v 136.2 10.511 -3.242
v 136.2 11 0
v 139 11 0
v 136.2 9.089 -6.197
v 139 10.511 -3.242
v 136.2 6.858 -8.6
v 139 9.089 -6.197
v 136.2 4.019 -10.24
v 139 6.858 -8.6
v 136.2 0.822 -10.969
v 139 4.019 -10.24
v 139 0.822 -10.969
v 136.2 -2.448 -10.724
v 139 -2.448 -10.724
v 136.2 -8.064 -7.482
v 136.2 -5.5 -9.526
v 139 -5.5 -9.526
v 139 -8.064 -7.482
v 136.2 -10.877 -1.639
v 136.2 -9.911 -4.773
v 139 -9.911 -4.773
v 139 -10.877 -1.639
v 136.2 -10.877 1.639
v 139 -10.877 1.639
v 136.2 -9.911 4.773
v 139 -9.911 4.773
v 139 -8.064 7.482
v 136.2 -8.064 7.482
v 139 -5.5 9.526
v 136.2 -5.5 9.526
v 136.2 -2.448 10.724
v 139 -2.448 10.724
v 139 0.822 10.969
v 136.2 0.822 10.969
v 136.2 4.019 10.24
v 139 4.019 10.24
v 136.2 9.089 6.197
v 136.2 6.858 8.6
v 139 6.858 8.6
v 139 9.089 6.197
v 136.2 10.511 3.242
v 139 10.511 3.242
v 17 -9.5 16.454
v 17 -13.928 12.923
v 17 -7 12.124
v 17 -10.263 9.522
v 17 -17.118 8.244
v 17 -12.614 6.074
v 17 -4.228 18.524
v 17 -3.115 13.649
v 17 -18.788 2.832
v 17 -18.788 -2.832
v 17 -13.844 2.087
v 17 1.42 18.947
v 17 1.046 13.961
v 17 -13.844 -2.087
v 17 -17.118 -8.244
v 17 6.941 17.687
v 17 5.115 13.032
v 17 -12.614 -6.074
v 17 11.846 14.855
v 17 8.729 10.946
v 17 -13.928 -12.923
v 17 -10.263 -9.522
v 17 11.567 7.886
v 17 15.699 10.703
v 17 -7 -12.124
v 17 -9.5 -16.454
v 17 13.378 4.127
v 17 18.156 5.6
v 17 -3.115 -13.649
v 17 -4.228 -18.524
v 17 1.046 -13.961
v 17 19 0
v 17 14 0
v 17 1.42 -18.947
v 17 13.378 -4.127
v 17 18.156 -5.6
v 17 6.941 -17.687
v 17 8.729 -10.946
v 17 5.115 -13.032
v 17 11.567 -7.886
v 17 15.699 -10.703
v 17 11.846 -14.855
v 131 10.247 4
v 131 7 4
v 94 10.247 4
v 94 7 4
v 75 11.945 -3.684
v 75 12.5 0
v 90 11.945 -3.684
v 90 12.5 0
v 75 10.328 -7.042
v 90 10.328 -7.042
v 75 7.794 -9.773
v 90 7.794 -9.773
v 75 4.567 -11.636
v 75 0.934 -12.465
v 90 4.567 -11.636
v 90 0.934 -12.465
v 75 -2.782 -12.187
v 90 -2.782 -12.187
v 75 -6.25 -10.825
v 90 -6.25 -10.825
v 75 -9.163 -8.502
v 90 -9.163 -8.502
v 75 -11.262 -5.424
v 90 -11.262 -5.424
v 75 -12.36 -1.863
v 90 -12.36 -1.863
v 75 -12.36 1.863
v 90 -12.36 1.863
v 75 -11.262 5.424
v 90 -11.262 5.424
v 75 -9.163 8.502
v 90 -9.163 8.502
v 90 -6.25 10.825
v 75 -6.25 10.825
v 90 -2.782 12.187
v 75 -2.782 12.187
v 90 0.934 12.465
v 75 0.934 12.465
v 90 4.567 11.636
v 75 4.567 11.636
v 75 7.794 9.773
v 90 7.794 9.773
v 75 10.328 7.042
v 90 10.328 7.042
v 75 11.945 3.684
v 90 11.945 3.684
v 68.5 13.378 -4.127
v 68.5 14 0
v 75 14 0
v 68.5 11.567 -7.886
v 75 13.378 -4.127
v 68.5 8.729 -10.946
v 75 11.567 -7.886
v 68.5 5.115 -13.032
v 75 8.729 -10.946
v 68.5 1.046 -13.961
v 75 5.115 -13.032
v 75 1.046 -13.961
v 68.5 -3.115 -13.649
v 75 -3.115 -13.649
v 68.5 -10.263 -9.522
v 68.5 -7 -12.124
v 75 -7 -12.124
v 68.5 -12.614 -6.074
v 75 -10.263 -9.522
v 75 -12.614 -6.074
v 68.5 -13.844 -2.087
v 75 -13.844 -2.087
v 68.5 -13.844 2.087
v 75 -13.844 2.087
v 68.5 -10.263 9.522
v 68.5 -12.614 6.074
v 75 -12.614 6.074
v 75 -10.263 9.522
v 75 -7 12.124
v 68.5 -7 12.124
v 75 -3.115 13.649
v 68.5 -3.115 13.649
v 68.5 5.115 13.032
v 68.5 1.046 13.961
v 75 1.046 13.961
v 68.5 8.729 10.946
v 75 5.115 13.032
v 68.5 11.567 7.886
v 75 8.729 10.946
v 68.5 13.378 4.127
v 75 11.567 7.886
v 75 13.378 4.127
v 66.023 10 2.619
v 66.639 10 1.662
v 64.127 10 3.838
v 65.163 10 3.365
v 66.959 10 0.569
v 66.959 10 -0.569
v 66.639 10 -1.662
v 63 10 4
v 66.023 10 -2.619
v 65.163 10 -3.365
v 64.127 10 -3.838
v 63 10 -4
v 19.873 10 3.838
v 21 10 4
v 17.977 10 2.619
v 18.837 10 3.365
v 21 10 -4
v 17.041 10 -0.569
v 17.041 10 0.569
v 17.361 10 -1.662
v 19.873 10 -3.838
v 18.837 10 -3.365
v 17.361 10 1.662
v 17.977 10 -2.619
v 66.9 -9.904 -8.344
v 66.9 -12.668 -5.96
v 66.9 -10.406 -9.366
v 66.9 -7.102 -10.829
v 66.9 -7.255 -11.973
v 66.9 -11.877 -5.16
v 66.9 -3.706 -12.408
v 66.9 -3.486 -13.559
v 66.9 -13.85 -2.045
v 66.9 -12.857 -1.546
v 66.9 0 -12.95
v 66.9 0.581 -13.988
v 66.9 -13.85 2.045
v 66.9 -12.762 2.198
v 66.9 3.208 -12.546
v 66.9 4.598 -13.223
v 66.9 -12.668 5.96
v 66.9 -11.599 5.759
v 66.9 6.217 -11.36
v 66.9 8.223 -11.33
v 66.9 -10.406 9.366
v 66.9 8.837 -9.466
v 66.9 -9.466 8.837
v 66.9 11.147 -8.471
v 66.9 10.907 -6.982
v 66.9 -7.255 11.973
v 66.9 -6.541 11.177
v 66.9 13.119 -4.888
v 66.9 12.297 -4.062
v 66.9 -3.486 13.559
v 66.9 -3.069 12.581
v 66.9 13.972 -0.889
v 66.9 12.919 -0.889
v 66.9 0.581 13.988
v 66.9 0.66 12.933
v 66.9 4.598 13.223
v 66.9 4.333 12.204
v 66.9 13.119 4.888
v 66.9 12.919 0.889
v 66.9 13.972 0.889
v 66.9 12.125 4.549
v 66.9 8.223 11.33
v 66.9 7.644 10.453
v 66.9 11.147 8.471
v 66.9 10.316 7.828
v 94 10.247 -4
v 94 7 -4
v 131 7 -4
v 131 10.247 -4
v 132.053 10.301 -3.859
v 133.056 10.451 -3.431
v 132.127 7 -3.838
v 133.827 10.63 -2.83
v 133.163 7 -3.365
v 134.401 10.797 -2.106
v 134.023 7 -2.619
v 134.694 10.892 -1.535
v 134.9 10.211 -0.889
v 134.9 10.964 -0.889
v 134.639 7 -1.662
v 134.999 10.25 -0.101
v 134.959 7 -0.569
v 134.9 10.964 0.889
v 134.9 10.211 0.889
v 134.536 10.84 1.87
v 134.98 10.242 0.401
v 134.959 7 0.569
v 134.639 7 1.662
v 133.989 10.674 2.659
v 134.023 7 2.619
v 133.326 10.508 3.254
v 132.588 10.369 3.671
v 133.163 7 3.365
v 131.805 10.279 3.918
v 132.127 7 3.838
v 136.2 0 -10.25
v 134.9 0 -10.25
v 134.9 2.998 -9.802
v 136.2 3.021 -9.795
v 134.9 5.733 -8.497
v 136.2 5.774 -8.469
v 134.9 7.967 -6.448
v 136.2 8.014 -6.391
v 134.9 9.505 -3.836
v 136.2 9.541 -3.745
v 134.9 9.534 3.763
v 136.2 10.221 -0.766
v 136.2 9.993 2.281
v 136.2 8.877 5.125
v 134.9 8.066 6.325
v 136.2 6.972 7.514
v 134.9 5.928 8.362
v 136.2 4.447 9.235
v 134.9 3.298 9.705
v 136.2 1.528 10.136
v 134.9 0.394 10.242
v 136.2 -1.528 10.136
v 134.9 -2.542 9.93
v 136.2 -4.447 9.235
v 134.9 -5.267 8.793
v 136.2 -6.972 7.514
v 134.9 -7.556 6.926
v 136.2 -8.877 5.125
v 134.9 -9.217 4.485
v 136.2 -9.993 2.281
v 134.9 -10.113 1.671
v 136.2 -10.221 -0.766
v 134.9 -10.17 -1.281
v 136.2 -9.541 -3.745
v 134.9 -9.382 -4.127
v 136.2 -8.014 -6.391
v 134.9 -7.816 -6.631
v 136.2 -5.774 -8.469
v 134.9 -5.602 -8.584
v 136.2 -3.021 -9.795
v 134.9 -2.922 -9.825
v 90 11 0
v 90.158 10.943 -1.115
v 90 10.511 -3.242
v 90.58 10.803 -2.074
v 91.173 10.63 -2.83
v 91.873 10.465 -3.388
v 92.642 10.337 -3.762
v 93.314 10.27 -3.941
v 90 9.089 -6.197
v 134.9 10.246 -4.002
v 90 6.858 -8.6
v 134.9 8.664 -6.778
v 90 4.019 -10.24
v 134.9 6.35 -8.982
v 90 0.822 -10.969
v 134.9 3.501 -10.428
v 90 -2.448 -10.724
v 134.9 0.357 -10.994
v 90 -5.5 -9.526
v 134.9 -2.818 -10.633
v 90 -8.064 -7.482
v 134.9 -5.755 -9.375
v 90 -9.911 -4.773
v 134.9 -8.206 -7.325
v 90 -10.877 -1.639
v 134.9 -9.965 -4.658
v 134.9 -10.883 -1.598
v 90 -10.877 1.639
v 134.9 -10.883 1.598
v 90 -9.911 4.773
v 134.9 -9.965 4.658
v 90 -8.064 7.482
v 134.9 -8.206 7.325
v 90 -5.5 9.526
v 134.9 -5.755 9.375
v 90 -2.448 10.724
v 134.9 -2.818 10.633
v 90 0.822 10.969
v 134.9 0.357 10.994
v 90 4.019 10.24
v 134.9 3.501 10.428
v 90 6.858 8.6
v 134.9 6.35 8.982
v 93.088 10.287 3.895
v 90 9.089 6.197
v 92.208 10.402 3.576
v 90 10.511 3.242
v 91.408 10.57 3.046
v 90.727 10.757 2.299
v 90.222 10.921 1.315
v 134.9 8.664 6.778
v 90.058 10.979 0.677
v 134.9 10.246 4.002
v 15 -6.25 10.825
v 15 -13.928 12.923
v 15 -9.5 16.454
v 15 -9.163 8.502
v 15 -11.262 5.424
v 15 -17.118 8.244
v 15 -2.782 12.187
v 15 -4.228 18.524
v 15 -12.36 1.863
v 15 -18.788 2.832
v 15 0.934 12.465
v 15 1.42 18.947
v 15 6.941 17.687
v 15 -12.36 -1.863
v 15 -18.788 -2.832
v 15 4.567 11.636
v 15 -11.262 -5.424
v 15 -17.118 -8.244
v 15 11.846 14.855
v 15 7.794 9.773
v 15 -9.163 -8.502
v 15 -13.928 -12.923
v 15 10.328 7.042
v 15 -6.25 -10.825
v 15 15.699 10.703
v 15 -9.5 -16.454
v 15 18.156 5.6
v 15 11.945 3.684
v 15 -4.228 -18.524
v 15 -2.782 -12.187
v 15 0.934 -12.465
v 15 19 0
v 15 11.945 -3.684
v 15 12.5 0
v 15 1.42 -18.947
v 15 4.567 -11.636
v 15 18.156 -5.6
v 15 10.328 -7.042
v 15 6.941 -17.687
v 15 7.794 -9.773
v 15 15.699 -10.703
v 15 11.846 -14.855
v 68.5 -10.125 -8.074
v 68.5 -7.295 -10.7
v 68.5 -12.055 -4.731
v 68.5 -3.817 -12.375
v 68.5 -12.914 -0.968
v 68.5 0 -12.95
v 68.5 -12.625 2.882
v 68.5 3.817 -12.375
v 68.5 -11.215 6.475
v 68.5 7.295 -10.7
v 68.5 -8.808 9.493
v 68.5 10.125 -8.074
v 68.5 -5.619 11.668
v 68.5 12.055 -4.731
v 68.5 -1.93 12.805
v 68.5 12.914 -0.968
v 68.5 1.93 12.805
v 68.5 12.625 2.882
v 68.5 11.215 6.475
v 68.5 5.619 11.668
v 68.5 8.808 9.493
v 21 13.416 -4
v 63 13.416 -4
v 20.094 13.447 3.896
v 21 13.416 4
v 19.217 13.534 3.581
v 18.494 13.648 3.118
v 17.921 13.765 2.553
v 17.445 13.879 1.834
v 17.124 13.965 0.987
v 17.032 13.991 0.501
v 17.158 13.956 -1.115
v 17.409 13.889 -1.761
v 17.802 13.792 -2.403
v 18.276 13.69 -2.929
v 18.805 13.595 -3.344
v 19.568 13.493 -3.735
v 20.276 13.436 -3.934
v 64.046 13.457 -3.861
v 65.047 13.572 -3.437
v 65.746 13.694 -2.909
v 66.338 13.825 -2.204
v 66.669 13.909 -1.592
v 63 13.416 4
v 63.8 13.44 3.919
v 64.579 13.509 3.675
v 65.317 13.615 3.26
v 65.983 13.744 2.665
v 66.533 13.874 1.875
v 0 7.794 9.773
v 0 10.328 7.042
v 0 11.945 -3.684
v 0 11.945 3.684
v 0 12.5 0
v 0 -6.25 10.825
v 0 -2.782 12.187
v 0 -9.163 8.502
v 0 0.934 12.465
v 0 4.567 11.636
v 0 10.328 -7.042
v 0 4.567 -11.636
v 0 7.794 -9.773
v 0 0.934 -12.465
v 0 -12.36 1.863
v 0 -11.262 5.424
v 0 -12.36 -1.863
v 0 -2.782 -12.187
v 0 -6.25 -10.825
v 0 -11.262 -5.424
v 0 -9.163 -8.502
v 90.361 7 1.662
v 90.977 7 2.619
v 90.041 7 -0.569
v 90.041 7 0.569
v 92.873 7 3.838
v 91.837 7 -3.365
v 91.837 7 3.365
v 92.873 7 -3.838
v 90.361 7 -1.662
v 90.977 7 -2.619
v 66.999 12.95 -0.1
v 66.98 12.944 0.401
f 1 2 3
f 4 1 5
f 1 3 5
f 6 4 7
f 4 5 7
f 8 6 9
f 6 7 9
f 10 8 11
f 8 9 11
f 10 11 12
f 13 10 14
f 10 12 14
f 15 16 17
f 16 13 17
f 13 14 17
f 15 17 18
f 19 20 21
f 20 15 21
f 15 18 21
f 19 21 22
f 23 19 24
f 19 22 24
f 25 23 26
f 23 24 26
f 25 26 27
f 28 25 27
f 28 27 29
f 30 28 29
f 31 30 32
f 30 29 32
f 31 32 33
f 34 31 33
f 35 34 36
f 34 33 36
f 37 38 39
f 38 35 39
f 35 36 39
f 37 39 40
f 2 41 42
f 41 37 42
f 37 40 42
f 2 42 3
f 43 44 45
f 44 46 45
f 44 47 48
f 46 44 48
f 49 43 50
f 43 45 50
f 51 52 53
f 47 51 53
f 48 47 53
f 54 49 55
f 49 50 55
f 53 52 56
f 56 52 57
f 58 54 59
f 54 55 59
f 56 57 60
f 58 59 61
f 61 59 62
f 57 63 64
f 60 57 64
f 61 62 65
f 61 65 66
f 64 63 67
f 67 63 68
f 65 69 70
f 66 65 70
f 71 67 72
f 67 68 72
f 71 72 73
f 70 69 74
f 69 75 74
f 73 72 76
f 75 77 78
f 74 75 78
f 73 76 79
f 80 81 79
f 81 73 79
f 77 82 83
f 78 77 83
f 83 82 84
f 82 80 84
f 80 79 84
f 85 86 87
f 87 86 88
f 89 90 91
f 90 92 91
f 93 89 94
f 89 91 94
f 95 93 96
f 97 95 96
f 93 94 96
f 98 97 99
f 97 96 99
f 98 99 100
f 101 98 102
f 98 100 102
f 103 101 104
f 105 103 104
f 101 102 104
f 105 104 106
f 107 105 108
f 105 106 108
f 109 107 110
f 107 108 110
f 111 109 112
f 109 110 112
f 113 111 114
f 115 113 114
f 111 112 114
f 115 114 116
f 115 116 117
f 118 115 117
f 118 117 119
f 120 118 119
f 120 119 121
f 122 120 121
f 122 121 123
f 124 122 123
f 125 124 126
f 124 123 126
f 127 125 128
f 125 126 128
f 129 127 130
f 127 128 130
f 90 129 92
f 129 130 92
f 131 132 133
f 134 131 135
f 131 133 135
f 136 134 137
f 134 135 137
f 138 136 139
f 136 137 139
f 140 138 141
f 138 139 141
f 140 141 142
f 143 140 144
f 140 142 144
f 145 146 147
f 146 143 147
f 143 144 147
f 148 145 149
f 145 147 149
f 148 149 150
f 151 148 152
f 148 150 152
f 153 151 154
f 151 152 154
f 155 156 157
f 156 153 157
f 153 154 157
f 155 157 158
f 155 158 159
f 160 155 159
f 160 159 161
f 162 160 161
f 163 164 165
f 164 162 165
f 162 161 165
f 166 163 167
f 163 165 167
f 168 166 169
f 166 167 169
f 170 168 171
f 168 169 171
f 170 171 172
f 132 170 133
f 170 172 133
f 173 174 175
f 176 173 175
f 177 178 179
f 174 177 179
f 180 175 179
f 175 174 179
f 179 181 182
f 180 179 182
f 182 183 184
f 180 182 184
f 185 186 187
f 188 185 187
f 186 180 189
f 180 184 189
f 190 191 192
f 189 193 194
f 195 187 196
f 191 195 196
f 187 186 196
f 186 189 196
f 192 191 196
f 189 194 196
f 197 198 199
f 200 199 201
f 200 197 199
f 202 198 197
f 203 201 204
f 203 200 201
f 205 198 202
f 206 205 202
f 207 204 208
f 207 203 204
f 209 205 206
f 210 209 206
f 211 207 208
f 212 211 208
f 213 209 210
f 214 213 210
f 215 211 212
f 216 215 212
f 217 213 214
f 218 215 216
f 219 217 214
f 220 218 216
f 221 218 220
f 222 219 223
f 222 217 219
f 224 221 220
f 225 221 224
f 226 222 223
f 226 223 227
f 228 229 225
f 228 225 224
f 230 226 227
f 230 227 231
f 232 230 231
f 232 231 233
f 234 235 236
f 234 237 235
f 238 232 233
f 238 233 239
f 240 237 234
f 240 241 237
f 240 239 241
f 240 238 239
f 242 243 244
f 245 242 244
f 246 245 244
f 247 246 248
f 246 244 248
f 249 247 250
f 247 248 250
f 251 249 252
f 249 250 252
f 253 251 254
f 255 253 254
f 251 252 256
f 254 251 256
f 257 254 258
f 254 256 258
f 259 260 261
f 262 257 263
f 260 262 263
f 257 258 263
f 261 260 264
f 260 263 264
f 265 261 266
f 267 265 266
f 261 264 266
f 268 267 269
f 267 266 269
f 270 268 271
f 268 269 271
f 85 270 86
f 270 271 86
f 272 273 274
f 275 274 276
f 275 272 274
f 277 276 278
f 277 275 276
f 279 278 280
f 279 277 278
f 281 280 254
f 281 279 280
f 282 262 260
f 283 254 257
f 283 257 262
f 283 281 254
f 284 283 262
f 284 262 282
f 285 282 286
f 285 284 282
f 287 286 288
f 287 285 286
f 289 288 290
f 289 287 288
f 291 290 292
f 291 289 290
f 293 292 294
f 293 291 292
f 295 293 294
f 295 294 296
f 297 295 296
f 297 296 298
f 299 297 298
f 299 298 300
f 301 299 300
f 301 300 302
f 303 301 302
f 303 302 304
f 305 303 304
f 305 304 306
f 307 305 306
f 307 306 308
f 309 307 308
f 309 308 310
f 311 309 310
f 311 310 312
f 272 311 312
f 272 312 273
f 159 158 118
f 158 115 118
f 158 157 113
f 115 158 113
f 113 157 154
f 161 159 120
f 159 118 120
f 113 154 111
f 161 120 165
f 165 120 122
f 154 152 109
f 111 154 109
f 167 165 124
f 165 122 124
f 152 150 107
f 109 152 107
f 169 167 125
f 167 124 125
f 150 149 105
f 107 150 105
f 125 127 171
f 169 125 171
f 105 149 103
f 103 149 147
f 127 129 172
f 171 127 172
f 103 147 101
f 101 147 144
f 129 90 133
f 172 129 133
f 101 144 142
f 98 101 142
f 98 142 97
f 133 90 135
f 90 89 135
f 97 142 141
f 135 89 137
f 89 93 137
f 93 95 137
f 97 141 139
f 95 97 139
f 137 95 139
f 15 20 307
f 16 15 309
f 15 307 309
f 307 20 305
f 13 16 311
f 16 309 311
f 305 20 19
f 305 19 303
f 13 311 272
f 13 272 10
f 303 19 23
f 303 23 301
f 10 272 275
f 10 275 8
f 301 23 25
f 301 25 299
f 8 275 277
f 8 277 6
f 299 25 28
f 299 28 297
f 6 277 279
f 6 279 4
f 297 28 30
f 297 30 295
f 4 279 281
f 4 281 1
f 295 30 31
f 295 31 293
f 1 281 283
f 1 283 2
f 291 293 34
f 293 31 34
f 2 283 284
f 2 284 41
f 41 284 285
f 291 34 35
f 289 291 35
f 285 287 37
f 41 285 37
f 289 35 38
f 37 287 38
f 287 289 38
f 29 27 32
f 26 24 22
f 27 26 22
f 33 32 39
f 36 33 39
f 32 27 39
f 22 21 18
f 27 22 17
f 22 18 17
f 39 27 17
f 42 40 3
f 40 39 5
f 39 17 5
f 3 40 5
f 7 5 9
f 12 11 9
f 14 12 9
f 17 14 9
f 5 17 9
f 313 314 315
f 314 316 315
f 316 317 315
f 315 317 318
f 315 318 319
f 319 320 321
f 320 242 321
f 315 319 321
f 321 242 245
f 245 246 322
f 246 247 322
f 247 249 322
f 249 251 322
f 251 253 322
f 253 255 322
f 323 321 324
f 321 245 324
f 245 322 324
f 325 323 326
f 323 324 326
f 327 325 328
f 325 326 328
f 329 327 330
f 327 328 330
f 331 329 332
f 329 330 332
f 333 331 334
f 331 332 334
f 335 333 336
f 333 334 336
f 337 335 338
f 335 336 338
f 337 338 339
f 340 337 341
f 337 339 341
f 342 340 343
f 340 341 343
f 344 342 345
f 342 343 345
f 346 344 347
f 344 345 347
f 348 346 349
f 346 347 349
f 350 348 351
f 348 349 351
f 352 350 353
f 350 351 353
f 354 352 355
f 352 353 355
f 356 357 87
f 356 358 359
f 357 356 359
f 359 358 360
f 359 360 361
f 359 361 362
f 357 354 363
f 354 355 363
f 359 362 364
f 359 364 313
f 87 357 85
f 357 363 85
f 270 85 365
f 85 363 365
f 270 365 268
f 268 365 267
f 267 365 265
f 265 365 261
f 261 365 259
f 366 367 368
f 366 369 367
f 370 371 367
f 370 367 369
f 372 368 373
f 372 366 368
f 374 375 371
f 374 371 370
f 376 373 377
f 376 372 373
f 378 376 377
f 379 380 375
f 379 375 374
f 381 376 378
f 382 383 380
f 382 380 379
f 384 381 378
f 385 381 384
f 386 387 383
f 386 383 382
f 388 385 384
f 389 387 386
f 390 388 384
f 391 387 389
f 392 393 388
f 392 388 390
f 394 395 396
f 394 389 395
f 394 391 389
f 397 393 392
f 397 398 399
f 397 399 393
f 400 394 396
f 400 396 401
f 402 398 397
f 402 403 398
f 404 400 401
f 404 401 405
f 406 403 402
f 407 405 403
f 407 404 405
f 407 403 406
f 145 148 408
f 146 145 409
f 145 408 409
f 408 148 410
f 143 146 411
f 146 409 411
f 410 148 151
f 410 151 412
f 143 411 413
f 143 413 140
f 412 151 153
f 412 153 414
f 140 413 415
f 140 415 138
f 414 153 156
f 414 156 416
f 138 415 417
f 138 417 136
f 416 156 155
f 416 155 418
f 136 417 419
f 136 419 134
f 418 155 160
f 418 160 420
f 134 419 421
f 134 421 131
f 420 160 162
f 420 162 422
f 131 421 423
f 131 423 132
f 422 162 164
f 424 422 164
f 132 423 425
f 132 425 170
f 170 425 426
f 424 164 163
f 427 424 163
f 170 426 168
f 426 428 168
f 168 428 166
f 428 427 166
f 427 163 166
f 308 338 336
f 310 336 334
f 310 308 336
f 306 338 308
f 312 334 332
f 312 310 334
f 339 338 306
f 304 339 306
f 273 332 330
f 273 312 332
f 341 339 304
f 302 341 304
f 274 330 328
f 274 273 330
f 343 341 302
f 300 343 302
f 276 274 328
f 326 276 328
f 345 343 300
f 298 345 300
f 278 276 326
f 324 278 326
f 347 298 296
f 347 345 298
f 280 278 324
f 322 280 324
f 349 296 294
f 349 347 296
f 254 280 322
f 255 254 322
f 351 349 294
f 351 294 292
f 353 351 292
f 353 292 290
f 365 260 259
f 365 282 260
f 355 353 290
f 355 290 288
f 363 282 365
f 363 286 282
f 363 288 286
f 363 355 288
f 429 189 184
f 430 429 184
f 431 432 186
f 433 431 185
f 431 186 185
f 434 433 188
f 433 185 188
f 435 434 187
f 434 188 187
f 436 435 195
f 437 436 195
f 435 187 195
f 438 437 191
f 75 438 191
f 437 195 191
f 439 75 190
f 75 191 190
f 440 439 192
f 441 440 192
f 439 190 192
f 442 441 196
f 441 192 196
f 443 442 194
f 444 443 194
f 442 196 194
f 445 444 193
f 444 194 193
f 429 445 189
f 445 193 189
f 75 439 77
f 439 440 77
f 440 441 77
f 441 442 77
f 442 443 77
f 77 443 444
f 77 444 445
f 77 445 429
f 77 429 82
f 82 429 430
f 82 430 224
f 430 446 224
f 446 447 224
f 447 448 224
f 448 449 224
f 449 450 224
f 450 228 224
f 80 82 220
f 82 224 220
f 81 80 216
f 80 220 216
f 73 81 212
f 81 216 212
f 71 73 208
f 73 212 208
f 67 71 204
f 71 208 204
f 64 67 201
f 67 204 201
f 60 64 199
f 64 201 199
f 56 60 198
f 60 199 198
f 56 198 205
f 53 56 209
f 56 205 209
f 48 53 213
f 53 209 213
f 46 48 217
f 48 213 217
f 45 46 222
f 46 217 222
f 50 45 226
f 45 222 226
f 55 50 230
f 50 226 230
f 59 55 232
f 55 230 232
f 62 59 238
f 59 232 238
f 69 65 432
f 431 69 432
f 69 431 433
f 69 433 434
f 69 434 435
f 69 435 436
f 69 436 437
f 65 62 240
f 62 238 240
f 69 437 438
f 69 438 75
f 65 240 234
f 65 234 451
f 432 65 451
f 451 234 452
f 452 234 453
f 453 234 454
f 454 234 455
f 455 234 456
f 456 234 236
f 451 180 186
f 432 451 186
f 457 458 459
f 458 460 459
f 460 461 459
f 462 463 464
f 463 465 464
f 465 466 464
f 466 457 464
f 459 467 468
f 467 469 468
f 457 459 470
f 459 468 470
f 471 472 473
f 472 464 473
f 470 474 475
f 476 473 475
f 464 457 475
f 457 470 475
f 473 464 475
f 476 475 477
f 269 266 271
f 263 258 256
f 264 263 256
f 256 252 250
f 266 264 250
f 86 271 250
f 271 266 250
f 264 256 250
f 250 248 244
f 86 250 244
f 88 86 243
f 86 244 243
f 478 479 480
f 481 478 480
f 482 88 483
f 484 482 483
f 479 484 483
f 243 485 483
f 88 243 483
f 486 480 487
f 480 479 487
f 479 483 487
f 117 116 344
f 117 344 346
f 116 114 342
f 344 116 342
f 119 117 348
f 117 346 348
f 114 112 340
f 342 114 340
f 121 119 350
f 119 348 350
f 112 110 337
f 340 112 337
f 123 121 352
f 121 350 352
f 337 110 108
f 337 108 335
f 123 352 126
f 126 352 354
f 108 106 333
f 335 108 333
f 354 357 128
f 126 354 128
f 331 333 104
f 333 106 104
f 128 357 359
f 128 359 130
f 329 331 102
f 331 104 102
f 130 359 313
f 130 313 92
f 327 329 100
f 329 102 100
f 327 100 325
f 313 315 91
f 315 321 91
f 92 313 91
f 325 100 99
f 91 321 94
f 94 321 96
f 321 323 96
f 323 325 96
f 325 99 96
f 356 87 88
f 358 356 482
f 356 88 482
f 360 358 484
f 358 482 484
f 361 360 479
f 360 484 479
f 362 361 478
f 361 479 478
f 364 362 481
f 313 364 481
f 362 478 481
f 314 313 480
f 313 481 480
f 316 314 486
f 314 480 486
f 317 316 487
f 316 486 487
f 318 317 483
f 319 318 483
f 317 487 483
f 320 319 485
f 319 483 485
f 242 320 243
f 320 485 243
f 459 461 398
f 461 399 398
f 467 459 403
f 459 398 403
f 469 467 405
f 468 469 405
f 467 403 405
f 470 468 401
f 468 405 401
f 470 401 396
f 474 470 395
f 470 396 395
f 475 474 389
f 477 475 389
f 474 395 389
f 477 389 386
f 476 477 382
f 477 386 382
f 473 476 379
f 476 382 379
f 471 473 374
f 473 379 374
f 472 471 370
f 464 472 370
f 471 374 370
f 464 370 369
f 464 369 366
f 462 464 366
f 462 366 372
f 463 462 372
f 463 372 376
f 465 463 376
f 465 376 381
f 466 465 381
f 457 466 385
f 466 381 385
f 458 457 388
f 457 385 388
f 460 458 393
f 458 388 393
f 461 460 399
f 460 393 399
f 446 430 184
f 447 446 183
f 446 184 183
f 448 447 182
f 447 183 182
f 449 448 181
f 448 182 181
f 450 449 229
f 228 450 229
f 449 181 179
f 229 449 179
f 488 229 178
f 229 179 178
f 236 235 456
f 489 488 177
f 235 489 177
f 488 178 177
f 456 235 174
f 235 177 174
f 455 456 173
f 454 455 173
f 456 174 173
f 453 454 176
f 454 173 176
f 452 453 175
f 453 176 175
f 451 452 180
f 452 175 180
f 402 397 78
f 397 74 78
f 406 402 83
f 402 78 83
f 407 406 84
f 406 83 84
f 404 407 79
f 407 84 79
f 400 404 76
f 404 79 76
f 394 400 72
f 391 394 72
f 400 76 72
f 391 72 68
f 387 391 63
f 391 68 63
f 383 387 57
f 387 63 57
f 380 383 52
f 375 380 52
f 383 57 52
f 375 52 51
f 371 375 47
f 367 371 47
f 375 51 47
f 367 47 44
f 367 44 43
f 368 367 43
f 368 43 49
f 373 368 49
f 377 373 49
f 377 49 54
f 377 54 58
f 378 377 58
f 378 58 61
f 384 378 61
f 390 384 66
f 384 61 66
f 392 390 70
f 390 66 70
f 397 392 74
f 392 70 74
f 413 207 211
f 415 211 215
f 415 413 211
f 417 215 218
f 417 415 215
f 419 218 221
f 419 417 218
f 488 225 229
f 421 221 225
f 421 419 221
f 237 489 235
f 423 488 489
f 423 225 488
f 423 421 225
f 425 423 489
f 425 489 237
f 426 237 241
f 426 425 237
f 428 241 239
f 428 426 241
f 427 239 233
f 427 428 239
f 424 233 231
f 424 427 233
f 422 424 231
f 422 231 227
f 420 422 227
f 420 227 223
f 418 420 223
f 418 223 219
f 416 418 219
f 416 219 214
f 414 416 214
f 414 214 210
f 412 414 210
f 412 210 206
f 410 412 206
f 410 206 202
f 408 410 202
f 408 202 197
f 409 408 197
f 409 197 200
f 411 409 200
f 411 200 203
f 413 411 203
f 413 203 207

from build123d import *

# Parameters (mm, degrees)
CUT_EXTRUDE_START   = 10
CUT_EXTRUDE_1_DEPTH = 132.573302568
CUT_EXTRUDE_START_2 = 7
CUT_EXTRUDE_2_DEPTH = 135.573302568
CUT_EXTRUDE_START_3 = 68.5
SKETCH_4_R          = 14
SKETCH_4_R_2        = 12.95
CUT_EXTRUDE_3_DEPTH = 1.6
CUT_EXTRUDE_START_4 = 136.2
SKETCH_5_R          = 11
SKETCH_5_R_2        = 10.25
CUT_EXTRUDE_4_DEPTH = 1.3


with BuildPart() as part:
    # Эскиз1 → Повернуть1 (revolve)
    with BuildSketch(Plane.XY):
        Polygon((0, 0), (0, 12.5), (15, 12.5), (15, 14), (15, 19), (17, 19), (17, 14), (75, 14), (75, 12.5), (90, 12.5), (90, 11), (139, 11), (139, 0), align=None)
    revolve(axis=Axis((139, 0, 0), (-1, 0, 0)))

    # Эскиз2 → Вырез-Вытянуть1 (cut, through all)
    with BuildSketch(Plane(origin=(0, 0, 0), x_dir=(1, 0, 0), z_dir=(0, 1, 0)).offset(CUT_EXTRUDE_START)):
        with BuildLine():
            Line((21, 4), (63, 4))
            ThreePointArc((63, 4), (67, 0), (63, -4))
            Line((63, -4), (21, -4))
            ThreePointArc((21, -4), (17, 0), (21, 4))
        make_face()
    extrude(amount=CUT_EXTRUDE_1_DEPTH, mode=Mode.SUBTRACT)

    # Эскиз3 → Вырез-Вытянуть2 (cut, through all)
    with BuildSketch(Plane(origin=(0, 0, 0), x_dir=(1, 0, 0), z_dir=(0, 1, 0)).offset(CUT_EXTRUDE_START_2)):
        with BuildLine():
            Line((94, 4), (131, 4))
            ThreePointArc((131, 4), (135, 0), (131, -4))
            Line((131, -4), (94, -4))
            ThreePointArc((94, -4), (90, 0), (94, 4))
        make_face()
    extrude(amount=CUT_EXTRUDE_2_DEPTH, mode=Mode.SUBTRACT)

    # Эскиз4 → Вырез-Вытянуть3 (cut)
    with BuildSketch(Plane(origin=(0, 0, 0), x_dir=(0, 0, -1), z_dir=(1, 0, 0)).offset(CUT_EXTRUDE_START_3)):
        with Locations(Location((0, 0, 0), (0, 0, 90))):
            Circle(SKETCH_4_R)
        Circle(SKETCH_4_R_2, mode=Mode.SUBTRACT)
    extrude(amount=-CUT_EXTRUDE_3_DEPTH, mode=Mode.SUBTRACT)

    # Эскиз5 → Вырез-Вытянуть4 (cut)
    with BuildSketch(Plane(origin=(0, 0, 0), x_dir=(0, 0, -1), z_dir=(1, 0, 0)).offset(CUT_EXTRUDE_START_4)):
        with Locations(Location((0, 0, 0), (0, 0, 90))):
            Circle(SKETCH_5_R)
        Circle(SKETCH_5_R_2, mode=Mode.SUBTRACT)
    extrude(amount=-CUT_EXTRUDE_4_DEPTH, mode=Mode.SUBTRACT)


solid = part.part
